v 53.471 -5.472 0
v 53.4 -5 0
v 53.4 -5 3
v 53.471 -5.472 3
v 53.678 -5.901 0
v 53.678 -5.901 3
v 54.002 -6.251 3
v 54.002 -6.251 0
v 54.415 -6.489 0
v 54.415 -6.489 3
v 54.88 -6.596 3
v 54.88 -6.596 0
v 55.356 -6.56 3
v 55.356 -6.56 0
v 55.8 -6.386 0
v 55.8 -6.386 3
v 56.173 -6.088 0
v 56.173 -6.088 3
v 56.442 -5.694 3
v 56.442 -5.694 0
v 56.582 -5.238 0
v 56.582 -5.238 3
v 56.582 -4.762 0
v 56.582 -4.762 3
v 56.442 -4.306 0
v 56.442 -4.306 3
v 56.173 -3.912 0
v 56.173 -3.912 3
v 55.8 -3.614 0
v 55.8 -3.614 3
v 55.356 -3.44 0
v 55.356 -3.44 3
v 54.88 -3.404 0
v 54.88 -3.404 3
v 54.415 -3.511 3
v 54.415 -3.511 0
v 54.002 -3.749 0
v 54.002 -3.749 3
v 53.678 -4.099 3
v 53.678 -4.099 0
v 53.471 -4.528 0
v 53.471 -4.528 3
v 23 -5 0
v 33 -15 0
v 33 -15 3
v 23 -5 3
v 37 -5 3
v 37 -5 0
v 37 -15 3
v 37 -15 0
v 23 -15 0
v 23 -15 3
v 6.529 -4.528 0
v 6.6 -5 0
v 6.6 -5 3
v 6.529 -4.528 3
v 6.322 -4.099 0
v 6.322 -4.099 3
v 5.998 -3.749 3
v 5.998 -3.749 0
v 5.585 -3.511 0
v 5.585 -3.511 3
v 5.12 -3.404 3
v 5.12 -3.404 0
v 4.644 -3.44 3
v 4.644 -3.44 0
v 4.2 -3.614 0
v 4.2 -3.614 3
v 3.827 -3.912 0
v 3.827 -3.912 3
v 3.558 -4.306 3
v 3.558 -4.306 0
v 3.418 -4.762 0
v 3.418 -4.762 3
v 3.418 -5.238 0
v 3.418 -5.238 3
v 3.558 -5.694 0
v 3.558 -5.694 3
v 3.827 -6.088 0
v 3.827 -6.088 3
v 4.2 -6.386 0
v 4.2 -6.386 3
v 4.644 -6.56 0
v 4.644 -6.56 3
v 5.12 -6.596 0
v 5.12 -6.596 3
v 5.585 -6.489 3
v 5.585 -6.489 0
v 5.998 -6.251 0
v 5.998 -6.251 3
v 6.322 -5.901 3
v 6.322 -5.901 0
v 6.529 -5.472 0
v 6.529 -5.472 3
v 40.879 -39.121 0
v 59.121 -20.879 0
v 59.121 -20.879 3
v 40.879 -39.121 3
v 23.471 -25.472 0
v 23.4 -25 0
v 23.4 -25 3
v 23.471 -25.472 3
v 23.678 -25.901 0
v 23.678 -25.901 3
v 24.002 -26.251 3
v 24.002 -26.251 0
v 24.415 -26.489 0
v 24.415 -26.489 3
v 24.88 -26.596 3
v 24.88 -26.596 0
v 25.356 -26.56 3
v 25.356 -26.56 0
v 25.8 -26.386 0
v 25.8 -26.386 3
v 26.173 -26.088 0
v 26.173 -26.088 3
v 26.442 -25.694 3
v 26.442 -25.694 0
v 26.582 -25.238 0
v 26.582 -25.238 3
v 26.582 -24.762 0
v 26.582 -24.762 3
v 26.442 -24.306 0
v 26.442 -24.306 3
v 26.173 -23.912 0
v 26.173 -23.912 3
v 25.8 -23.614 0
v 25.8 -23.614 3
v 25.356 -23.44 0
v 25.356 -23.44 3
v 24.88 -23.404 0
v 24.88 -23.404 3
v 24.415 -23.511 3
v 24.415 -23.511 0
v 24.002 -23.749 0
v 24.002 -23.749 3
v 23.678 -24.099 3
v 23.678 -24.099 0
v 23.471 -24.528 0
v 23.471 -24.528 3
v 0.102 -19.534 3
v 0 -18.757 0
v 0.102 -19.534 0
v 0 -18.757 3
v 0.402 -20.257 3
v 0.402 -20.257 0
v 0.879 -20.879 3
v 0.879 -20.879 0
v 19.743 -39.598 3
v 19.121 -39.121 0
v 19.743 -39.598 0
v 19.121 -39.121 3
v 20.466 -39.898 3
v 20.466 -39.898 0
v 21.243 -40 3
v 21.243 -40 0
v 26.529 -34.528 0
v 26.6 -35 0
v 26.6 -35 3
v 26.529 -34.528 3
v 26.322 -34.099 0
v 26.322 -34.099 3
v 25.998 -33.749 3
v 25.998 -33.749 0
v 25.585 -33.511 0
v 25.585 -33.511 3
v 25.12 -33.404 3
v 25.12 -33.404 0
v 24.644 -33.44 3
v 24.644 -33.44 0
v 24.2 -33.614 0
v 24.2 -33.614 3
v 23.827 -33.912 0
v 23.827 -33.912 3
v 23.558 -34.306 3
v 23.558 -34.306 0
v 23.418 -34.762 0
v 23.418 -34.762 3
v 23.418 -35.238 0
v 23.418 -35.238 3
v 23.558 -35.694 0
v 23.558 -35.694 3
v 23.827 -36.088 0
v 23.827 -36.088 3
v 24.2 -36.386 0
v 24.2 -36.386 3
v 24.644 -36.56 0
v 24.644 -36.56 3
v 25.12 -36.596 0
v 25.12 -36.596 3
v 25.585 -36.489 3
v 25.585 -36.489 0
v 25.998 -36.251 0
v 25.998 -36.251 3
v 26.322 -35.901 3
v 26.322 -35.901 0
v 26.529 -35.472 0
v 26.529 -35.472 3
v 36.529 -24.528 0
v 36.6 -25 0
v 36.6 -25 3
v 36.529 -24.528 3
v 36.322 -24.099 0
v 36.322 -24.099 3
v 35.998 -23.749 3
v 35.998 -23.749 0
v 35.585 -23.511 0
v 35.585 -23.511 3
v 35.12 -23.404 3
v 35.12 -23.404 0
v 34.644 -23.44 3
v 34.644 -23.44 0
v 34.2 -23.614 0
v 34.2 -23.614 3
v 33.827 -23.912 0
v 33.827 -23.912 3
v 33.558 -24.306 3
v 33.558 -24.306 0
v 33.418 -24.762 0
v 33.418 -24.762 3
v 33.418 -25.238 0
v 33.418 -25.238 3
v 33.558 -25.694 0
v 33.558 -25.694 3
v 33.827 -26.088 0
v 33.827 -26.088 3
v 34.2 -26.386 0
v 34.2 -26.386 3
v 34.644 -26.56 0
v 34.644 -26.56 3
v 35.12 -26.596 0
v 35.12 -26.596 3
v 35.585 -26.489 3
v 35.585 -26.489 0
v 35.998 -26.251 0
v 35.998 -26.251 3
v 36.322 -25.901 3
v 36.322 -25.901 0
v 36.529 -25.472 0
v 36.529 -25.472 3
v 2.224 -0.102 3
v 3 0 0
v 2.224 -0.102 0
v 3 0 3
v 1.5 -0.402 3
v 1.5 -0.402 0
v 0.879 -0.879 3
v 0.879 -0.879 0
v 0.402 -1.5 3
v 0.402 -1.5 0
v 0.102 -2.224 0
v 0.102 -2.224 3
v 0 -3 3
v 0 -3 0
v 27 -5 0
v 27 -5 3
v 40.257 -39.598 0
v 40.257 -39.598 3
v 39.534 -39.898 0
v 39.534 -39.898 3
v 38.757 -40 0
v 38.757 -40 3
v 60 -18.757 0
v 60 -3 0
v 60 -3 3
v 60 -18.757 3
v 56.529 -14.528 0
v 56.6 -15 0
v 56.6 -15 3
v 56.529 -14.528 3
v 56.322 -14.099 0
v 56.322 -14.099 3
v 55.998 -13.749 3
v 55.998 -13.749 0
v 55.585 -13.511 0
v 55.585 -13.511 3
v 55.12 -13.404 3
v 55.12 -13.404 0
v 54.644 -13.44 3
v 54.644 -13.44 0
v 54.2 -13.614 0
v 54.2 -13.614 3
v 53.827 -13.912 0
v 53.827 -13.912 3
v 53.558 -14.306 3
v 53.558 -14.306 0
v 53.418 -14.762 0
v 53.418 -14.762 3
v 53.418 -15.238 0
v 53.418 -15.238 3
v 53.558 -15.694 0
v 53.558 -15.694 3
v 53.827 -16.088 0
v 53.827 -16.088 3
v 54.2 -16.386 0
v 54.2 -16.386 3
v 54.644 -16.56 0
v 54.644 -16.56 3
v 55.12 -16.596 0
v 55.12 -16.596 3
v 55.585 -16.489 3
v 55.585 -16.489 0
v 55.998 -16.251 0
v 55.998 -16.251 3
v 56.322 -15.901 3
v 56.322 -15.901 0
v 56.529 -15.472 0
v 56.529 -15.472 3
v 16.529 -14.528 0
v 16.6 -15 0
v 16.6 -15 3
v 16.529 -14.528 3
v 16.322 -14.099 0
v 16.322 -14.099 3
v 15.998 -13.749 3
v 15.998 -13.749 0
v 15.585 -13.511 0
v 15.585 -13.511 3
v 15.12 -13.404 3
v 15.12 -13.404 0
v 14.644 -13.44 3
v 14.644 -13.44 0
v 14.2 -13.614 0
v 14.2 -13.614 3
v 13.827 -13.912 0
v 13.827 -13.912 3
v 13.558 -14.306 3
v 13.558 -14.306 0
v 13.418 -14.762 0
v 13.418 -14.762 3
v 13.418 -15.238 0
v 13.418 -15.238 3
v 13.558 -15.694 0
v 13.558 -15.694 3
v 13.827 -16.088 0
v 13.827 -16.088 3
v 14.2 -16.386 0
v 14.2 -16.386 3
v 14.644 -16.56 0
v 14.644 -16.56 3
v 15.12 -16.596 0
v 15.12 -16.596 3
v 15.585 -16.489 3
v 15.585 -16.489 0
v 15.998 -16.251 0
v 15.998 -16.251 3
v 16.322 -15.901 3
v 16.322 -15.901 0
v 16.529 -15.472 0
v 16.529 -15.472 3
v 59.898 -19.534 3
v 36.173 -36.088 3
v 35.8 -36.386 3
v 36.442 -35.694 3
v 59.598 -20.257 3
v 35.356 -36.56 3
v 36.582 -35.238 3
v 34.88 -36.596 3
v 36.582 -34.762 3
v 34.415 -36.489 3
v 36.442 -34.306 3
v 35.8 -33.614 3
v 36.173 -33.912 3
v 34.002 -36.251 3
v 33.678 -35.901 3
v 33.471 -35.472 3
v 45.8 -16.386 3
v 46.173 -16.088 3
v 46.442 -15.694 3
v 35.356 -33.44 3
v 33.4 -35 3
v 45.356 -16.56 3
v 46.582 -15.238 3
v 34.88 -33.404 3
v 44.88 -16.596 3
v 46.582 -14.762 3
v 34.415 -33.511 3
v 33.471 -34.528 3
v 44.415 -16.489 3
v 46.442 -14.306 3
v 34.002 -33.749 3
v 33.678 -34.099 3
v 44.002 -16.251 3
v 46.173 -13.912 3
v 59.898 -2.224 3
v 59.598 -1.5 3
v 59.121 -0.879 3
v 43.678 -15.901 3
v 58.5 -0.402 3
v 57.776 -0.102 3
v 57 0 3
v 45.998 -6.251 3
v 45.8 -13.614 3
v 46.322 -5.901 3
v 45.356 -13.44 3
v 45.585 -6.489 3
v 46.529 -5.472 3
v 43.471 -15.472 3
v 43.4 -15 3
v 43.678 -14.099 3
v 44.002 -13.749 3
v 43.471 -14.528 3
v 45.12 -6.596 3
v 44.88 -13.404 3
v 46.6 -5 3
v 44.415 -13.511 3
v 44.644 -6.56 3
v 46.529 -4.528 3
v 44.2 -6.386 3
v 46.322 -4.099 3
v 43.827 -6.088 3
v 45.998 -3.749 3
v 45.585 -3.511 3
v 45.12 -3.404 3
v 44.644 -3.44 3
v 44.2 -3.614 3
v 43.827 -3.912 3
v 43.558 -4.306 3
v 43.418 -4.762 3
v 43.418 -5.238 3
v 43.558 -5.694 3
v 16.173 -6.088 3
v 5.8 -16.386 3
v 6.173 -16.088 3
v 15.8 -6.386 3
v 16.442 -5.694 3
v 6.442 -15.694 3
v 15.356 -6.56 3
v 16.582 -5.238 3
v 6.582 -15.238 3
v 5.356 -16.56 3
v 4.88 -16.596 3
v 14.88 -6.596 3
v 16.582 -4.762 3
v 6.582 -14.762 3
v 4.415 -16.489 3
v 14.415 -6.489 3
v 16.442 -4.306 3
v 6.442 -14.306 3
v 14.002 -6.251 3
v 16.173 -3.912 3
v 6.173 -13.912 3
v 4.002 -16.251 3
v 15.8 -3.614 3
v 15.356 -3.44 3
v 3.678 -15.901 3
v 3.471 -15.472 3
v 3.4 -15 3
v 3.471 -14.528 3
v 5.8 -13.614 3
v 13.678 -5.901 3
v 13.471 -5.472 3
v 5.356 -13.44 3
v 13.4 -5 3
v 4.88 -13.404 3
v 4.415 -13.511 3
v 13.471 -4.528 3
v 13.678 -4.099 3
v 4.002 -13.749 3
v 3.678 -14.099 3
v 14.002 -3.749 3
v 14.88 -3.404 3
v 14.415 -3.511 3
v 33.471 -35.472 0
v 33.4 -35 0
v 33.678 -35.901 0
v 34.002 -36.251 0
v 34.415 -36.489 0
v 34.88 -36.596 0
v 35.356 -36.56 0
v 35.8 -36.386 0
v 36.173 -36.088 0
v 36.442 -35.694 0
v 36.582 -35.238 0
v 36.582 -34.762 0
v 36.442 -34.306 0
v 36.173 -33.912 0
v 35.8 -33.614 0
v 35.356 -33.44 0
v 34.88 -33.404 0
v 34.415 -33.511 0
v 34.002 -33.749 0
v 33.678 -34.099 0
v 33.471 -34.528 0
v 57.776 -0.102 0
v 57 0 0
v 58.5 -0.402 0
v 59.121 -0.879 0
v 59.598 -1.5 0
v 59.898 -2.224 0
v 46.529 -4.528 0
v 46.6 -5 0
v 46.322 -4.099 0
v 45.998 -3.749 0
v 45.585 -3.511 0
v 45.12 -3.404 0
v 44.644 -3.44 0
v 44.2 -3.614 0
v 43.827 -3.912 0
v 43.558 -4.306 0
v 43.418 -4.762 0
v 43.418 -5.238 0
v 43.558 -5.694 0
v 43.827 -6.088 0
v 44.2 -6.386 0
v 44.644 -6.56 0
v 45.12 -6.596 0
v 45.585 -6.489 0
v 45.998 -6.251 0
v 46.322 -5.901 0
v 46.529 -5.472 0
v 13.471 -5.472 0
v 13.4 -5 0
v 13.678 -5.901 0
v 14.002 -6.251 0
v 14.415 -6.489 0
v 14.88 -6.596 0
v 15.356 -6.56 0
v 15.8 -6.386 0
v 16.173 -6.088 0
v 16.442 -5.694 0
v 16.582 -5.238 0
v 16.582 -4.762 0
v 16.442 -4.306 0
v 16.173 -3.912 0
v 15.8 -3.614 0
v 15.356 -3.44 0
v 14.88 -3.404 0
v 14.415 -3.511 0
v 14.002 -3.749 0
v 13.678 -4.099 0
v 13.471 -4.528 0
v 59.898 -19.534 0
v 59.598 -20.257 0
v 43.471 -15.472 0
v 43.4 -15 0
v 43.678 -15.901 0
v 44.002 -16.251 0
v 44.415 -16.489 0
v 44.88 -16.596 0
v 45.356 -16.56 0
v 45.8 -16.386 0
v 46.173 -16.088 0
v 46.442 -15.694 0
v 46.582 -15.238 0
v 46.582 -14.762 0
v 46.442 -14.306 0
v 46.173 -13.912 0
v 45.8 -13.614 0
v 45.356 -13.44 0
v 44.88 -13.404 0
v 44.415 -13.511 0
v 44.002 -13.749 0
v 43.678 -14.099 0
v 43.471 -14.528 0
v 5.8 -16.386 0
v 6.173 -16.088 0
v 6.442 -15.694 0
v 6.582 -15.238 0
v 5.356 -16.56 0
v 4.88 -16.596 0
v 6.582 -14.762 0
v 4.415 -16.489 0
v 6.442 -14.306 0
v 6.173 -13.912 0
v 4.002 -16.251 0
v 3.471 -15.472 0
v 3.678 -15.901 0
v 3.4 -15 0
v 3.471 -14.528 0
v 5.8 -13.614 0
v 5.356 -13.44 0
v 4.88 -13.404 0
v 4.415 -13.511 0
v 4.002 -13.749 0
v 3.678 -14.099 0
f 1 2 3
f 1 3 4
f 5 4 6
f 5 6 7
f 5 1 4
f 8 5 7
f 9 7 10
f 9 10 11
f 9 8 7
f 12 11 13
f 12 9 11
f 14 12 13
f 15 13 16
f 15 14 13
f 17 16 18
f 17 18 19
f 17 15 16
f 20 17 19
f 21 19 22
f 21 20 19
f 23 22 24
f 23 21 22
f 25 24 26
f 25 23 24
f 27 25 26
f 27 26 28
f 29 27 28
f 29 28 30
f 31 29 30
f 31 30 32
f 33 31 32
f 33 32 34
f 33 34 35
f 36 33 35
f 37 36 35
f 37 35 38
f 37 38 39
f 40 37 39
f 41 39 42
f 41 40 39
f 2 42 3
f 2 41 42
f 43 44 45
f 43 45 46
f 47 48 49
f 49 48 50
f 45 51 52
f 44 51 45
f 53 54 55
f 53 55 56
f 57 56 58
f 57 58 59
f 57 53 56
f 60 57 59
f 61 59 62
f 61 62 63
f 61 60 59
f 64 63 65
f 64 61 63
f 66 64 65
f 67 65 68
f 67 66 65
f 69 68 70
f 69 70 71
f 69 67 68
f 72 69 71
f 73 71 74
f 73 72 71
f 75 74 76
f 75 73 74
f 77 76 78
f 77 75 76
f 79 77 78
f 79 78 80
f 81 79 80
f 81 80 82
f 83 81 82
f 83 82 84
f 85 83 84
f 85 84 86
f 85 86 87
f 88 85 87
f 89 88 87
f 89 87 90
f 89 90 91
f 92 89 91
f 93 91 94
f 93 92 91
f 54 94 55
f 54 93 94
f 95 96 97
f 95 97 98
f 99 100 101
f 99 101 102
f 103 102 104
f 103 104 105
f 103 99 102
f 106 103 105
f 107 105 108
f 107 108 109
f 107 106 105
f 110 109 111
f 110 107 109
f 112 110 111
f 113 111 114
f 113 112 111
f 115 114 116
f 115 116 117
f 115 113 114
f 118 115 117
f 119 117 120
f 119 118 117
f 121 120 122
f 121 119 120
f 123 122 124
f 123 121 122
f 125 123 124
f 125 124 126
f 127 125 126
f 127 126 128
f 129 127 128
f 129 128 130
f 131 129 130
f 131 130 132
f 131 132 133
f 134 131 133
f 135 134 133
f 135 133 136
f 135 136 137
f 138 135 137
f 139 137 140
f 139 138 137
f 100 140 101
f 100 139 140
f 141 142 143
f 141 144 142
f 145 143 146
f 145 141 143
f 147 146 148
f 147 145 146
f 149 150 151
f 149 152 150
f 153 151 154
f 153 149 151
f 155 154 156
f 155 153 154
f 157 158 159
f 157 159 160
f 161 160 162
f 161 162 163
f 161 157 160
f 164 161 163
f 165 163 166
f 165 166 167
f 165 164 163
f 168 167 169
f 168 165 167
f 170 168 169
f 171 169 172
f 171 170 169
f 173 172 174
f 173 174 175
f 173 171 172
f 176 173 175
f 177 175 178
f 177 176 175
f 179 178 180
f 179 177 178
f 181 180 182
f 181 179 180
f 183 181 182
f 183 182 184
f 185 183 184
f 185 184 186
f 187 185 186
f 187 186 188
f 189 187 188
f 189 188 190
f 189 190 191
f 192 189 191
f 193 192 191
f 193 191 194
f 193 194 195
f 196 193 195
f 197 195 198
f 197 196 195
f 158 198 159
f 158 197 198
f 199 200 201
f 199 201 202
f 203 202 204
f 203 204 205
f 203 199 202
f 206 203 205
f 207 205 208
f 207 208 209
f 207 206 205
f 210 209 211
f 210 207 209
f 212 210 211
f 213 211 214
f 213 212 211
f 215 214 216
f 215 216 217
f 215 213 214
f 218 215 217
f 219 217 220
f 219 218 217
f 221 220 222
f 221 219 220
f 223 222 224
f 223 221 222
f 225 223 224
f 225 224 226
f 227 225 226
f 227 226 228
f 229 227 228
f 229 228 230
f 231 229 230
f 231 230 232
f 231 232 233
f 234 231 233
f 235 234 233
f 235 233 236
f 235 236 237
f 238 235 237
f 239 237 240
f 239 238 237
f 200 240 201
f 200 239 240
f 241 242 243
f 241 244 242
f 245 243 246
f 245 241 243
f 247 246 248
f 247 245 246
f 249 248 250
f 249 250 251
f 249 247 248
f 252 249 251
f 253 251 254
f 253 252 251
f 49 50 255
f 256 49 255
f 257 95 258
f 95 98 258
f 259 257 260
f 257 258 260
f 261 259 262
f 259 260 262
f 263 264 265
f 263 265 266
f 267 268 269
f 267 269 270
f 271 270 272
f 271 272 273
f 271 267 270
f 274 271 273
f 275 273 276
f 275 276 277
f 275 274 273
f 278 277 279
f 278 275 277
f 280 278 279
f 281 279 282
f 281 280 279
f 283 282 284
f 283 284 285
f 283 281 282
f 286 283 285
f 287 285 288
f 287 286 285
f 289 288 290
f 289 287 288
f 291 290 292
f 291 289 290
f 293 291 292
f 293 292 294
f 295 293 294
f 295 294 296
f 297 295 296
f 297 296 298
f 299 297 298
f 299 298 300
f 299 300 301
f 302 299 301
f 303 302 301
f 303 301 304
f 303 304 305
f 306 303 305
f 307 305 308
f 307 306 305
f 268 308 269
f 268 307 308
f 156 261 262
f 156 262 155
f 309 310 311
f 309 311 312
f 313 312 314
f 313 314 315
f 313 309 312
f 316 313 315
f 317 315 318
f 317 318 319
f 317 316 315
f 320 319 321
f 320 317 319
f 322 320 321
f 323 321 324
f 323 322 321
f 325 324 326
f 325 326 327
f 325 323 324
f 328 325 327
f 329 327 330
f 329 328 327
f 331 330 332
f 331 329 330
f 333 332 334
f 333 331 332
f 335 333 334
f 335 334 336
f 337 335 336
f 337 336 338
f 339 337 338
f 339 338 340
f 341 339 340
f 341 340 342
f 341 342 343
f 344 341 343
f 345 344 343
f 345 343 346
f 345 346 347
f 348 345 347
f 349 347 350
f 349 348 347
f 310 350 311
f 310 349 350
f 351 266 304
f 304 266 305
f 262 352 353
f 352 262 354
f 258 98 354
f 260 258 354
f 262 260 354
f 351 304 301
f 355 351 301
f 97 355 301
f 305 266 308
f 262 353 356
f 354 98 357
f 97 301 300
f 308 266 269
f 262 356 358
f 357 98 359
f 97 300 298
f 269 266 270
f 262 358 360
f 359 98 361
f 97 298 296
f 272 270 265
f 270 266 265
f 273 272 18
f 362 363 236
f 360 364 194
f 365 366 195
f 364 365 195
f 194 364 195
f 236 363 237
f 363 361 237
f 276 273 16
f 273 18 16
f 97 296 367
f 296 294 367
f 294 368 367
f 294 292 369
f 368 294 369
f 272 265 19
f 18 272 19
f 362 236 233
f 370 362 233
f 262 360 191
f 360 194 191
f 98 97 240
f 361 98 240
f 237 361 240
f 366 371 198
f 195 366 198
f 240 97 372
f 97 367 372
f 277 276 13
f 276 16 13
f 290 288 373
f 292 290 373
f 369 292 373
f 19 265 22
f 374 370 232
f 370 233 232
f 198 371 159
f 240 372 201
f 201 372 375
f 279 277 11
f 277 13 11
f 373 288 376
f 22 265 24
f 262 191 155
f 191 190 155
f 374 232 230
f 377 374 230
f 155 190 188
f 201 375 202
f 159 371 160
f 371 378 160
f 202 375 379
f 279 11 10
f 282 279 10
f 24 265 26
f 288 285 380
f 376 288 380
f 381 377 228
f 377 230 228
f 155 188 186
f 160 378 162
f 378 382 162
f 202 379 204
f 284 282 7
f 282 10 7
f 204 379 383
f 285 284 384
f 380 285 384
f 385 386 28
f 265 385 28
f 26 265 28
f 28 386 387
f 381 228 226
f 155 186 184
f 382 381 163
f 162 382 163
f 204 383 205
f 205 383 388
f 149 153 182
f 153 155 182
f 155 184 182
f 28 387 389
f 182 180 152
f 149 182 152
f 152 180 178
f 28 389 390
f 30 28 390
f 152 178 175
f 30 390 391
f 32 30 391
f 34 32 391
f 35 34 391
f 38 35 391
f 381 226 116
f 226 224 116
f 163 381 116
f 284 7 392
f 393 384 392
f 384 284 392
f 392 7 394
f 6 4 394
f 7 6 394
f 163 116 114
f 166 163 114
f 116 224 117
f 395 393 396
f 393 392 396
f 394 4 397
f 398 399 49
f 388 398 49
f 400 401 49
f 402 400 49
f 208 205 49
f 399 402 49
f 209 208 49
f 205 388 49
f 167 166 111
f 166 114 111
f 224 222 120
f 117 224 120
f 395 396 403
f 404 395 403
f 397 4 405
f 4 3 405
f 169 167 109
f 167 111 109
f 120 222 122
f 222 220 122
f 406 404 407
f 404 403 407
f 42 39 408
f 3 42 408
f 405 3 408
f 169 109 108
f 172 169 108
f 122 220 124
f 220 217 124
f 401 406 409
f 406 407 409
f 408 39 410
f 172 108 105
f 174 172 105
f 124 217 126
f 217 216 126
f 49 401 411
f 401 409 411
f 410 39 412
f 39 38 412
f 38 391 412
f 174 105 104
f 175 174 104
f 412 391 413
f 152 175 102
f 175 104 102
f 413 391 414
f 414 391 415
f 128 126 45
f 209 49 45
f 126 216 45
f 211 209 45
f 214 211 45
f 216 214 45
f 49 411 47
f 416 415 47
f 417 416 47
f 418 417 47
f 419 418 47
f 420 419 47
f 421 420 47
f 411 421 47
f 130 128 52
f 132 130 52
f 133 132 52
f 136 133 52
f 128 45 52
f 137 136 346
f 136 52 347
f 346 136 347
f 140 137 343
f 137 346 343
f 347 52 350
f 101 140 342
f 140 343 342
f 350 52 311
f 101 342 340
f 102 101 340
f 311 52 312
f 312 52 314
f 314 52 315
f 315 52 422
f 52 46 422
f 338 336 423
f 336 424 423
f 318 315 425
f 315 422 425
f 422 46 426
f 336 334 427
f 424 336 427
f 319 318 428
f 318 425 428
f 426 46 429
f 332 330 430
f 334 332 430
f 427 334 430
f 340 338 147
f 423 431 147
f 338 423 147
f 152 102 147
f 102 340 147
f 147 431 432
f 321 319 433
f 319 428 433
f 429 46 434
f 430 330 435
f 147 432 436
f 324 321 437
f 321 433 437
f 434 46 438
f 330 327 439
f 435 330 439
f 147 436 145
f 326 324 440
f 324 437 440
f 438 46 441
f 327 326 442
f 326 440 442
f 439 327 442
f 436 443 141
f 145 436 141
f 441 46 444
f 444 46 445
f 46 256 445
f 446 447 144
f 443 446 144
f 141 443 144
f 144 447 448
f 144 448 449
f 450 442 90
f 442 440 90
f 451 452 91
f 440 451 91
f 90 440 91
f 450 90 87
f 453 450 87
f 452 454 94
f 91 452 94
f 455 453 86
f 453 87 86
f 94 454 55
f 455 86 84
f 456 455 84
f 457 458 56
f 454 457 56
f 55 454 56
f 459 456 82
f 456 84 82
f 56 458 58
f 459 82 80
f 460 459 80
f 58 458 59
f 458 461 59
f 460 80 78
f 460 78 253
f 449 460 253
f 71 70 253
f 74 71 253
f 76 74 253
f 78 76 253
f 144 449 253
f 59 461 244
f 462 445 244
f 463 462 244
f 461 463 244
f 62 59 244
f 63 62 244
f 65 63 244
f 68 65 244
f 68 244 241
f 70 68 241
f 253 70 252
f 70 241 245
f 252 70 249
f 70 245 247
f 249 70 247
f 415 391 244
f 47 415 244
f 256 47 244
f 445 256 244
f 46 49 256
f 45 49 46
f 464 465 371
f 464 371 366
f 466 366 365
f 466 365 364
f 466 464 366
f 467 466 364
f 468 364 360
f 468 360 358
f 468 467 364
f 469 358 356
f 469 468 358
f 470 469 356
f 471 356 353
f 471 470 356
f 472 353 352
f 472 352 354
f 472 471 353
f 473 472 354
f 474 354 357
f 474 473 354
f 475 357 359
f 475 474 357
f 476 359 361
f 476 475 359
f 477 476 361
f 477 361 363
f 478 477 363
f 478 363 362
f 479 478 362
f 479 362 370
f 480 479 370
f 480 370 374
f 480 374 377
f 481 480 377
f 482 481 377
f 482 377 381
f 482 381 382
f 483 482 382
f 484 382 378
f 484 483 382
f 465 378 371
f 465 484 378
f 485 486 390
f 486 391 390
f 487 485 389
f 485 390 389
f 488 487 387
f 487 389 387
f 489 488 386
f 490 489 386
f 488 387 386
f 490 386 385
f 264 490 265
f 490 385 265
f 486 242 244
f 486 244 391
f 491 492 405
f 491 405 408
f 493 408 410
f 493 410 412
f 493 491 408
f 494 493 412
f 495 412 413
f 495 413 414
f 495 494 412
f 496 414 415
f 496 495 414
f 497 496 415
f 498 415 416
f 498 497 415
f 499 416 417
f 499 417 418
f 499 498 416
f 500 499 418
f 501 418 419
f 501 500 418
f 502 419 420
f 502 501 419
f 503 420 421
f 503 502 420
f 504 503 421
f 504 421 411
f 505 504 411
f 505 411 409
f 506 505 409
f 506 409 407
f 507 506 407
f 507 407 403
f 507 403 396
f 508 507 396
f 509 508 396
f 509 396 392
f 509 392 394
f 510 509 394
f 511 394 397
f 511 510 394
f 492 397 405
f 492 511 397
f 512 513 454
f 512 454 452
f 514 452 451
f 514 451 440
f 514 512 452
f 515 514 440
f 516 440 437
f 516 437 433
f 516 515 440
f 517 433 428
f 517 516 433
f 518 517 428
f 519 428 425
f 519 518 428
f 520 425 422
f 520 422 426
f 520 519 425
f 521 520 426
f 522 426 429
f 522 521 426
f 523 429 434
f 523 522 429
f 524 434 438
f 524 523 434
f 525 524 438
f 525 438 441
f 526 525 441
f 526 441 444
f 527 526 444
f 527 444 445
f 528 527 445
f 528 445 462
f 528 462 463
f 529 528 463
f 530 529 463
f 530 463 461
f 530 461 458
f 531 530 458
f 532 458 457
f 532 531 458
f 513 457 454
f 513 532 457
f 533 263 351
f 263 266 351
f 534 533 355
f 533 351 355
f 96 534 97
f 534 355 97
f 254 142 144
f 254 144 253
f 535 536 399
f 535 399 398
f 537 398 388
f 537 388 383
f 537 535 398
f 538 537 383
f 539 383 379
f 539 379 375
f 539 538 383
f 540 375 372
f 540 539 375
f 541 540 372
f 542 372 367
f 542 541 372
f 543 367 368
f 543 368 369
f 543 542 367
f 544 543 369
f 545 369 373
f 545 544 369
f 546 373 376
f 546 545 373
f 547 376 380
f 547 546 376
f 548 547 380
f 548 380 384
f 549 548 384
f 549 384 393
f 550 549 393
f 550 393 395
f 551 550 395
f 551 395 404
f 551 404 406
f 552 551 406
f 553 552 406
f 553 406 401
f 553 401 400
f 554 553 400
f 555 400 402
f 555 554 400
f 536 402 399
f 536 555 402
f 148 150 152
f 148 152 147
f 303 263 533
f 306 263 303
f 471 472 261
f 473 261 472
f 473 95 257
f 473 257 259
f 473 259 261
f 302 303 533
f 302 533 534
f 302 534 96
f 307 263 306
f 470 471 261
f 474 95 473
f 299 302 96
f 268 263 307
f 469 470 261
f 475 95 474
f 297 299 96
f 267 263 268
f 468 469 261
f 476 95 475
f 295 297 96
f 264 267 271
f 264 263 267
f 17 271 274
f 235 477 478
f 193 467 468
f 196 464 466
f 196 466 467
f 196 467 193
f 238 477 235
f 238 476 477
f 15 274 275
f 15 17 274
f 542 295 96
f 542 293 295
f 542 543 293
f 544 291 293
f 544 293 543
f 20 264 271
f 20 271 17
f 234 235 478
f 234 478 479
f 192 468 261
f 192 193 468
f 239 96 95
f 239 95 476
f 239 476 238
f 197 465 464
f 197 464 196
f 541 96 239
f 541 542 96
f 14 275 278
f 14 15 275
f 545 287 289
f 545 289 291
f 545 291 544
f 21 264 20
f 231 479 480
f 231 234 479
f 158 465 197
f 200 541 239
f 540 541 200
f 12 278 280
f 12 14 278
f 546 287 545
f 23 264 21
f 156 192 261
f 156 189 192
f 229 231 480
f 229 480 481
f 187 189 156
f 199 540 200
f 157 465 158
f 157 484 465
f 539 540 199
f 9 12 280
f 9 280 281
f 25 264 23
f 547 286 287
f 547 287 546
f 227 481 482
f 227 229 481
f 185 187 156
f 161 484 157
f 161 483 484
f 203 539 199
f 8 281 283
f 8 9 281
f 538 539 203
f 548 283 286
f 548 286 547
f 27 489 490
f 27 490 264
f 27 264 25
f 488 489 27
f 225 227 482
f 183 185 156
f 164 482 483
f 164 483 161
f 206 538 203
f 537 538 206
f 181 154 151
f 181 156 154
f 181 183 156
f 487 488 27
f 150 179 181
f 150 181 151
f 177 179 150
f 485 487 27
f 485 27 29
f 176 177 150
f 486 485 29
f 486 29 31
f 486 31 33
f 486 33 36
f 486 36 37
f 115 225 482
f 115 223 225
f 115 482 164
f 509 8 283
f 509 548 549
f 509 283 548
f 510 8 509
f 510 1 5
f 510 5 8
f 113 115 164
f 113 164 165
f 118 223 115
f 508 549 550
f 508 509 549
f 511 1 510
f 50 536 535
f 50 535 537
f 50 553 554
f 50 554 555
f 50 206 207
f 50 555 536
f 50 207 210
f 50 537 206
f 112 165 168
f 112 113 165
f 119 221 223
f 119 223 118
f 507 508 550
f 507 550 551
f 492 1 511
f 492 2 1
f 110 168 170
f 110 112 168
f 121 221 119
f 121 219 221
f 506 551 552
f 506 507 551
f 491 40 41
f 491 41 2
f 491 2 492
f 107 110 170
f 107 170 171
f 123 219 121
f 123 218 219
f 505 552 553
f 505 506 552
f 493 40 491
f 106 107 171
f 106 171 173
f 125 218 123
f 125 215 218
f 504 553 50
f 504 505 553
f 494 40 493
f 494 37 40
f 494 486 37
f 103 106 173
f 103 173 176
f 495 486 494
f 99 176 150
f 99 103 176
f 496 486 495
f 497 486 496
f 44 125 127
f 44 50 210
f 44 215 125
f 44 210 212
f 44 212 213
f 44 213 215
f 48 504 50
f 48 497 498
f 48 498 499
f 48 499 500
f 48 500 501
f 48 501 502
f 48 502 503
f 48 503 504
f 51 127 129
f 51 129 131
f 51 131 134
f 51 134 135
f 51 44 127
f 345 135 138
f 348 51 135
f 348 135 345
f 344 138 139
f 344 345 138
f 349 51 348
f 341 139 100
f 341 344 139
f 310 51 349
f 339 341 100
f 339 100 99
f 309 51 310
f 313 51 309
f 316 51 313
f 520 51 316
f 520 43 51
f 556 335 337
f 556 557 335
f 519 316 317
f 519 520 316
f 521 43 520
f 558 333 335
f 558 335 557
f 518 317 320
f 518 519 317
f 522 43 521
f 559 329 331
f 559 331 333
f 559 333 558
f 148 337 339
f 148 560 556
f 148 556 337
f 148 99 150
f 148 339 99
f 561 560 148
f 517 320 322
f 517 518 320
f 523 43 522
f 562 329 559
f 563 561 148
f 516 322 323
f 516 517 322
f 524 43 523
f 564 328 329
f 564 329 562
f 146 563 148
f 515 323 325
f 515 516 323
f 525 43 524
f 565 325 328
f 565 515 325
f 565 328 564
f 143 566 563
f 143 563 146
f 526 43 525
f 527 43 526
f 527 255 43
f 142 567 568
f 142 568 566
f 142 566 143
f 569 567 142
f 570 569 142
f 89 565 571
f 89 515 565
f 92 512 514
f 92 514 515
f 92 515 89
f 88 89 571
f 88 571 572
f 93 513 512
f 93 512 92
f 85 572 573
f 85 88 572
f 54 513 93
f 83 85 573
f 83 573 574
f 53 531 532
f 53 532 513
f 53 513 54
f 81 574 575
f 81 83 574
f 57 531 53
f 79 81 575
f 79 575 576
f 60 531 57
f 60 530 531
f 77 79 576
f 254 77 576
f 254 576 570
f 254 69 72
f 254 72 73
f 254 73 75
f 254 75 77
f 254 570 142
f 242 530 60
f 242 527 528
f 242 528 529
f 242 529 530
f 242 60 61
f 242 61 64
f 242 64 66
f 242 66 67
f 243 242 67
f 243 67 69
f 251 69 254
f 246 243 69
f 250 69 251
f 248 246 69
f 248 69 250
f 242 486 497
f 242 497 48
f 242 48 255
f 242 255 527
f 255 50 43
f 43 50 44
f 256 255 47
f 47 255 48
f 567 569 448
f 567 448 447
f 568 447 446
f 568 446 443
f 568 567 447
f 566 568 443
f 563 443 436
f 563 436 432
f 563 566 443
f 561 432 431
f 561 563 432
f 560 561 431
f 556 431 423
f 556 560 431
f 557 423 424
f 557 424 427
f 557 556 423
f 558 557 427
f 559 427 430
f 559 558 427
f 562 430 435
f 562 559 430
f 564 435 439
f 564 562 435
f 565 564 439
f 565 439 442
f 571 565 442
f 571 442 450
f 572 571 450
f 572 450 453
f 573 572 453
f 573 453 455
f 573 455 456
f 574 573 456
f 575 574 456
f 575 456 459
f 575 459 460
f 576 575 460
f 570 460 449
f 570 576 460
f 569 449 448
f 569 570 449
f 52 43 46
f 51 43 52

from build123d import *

# Parameters (mm, degrees)
SKETCH_1_R      = 1.6
EXTRUDE_1_DEPTH = 3
FILLET_1_R      = 3


with BuildPart() as part:
    # 草图1 → 凸台-拉伸1 (new body)
    with BuildSketch(Plane.XY):
        Polygon((0, 0), (60, 0), (60, -20), (40, -40), (20, -40), (0, -20), align=None)
        with Locations((5, -5)):
            Circle(SKETCH_1_R, mode=Mode.SUBTRACT)
        with Locations(Location((15, -5, 0), (0, 0, 180))):
            Circle(SKETCH_1_R, mode=Mode.SUBTRACT)
        with Locations((15, -15)):
            Circle(SKETCH_1_R, mode=Mode.SUBTRACT)
        with Locations(Location((5, -15, 0), (0, 0, 180))):
            Circle(SKETCH_1_R, mode=Mode.SUBTRACT)
        with Locations((55, -15)):
            Circle(SKETCH_1_R, mode=Mode.SUBTRACT)
        with Locations(Location((45, -15, 0), (0, 0, 180))):
            Circle(SKETCH_1_R, mode=Mode.SUBTRACT)
        with Locations((45, -5)):
            Circle(SKETCH_1_R, mode=Mode.SUBTRACT)
        with Locations(Location((55, -5, 0), (0, 0, 180))):
            Circle(SKETCH_1_R, mode=Mode.SUBTRACT)
        with Locations((25, -35)):
            Circle(SKETCH_1_R, mode=Mode.SUBTRACT)
        with Locations(Location((35, -35, 0), (0, 0, 180))):
            Circle(SKETCH_1_R, mode=Mode.SUBTRACT)
        with Locations((35, -25)):
            Circle(SKETCH_1_R, mode=Mode.SUBTRACT)
        with Locations(Location((25, -25, 0), (0, 0, 180))):
            Circle(SKETCH_1_R, mode=Mode.SUBTRACT)
        Polygon((23, -5), (23, -15), (33, -15), align=None, mode=Mode.SUBTRACT)
        Polygon((27, -5), (37, -5), (37, -15), align=None, mode=Mode.SUBTRACT)
    extrude(amount=EXTRUDE_1_DEPTH)

    # 圆角1
    fillet_1_edges = [part.edges().sort_by_distance(p)[0] for p in [
        (0, 0, 1.5),
        (60, 0, 1.5),
        (60, -20, 1.5),
        (40, -40, 1.5),
        (20, -40, 1.5),
        (0, -20, 1.5),
    ]]
    fillet(fillet_1_edges, radius=FILLET_1_R)


solid = part.part
